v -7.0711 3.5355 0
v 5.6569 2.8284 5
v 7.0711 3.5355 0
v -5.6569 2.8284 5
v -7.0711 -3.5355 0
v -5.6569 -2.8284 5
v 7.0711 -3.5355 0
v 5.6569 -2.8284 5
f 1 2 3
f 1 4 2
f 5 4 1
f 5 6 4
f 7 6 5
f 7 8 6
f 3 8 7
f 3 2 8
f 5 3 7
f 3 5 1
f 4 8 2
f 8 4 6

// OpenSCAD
color("orange")
scale([2, 1, 1])
rotate([0, 0, 45])
cylinder(5, 5, 4, $fn = 4);
